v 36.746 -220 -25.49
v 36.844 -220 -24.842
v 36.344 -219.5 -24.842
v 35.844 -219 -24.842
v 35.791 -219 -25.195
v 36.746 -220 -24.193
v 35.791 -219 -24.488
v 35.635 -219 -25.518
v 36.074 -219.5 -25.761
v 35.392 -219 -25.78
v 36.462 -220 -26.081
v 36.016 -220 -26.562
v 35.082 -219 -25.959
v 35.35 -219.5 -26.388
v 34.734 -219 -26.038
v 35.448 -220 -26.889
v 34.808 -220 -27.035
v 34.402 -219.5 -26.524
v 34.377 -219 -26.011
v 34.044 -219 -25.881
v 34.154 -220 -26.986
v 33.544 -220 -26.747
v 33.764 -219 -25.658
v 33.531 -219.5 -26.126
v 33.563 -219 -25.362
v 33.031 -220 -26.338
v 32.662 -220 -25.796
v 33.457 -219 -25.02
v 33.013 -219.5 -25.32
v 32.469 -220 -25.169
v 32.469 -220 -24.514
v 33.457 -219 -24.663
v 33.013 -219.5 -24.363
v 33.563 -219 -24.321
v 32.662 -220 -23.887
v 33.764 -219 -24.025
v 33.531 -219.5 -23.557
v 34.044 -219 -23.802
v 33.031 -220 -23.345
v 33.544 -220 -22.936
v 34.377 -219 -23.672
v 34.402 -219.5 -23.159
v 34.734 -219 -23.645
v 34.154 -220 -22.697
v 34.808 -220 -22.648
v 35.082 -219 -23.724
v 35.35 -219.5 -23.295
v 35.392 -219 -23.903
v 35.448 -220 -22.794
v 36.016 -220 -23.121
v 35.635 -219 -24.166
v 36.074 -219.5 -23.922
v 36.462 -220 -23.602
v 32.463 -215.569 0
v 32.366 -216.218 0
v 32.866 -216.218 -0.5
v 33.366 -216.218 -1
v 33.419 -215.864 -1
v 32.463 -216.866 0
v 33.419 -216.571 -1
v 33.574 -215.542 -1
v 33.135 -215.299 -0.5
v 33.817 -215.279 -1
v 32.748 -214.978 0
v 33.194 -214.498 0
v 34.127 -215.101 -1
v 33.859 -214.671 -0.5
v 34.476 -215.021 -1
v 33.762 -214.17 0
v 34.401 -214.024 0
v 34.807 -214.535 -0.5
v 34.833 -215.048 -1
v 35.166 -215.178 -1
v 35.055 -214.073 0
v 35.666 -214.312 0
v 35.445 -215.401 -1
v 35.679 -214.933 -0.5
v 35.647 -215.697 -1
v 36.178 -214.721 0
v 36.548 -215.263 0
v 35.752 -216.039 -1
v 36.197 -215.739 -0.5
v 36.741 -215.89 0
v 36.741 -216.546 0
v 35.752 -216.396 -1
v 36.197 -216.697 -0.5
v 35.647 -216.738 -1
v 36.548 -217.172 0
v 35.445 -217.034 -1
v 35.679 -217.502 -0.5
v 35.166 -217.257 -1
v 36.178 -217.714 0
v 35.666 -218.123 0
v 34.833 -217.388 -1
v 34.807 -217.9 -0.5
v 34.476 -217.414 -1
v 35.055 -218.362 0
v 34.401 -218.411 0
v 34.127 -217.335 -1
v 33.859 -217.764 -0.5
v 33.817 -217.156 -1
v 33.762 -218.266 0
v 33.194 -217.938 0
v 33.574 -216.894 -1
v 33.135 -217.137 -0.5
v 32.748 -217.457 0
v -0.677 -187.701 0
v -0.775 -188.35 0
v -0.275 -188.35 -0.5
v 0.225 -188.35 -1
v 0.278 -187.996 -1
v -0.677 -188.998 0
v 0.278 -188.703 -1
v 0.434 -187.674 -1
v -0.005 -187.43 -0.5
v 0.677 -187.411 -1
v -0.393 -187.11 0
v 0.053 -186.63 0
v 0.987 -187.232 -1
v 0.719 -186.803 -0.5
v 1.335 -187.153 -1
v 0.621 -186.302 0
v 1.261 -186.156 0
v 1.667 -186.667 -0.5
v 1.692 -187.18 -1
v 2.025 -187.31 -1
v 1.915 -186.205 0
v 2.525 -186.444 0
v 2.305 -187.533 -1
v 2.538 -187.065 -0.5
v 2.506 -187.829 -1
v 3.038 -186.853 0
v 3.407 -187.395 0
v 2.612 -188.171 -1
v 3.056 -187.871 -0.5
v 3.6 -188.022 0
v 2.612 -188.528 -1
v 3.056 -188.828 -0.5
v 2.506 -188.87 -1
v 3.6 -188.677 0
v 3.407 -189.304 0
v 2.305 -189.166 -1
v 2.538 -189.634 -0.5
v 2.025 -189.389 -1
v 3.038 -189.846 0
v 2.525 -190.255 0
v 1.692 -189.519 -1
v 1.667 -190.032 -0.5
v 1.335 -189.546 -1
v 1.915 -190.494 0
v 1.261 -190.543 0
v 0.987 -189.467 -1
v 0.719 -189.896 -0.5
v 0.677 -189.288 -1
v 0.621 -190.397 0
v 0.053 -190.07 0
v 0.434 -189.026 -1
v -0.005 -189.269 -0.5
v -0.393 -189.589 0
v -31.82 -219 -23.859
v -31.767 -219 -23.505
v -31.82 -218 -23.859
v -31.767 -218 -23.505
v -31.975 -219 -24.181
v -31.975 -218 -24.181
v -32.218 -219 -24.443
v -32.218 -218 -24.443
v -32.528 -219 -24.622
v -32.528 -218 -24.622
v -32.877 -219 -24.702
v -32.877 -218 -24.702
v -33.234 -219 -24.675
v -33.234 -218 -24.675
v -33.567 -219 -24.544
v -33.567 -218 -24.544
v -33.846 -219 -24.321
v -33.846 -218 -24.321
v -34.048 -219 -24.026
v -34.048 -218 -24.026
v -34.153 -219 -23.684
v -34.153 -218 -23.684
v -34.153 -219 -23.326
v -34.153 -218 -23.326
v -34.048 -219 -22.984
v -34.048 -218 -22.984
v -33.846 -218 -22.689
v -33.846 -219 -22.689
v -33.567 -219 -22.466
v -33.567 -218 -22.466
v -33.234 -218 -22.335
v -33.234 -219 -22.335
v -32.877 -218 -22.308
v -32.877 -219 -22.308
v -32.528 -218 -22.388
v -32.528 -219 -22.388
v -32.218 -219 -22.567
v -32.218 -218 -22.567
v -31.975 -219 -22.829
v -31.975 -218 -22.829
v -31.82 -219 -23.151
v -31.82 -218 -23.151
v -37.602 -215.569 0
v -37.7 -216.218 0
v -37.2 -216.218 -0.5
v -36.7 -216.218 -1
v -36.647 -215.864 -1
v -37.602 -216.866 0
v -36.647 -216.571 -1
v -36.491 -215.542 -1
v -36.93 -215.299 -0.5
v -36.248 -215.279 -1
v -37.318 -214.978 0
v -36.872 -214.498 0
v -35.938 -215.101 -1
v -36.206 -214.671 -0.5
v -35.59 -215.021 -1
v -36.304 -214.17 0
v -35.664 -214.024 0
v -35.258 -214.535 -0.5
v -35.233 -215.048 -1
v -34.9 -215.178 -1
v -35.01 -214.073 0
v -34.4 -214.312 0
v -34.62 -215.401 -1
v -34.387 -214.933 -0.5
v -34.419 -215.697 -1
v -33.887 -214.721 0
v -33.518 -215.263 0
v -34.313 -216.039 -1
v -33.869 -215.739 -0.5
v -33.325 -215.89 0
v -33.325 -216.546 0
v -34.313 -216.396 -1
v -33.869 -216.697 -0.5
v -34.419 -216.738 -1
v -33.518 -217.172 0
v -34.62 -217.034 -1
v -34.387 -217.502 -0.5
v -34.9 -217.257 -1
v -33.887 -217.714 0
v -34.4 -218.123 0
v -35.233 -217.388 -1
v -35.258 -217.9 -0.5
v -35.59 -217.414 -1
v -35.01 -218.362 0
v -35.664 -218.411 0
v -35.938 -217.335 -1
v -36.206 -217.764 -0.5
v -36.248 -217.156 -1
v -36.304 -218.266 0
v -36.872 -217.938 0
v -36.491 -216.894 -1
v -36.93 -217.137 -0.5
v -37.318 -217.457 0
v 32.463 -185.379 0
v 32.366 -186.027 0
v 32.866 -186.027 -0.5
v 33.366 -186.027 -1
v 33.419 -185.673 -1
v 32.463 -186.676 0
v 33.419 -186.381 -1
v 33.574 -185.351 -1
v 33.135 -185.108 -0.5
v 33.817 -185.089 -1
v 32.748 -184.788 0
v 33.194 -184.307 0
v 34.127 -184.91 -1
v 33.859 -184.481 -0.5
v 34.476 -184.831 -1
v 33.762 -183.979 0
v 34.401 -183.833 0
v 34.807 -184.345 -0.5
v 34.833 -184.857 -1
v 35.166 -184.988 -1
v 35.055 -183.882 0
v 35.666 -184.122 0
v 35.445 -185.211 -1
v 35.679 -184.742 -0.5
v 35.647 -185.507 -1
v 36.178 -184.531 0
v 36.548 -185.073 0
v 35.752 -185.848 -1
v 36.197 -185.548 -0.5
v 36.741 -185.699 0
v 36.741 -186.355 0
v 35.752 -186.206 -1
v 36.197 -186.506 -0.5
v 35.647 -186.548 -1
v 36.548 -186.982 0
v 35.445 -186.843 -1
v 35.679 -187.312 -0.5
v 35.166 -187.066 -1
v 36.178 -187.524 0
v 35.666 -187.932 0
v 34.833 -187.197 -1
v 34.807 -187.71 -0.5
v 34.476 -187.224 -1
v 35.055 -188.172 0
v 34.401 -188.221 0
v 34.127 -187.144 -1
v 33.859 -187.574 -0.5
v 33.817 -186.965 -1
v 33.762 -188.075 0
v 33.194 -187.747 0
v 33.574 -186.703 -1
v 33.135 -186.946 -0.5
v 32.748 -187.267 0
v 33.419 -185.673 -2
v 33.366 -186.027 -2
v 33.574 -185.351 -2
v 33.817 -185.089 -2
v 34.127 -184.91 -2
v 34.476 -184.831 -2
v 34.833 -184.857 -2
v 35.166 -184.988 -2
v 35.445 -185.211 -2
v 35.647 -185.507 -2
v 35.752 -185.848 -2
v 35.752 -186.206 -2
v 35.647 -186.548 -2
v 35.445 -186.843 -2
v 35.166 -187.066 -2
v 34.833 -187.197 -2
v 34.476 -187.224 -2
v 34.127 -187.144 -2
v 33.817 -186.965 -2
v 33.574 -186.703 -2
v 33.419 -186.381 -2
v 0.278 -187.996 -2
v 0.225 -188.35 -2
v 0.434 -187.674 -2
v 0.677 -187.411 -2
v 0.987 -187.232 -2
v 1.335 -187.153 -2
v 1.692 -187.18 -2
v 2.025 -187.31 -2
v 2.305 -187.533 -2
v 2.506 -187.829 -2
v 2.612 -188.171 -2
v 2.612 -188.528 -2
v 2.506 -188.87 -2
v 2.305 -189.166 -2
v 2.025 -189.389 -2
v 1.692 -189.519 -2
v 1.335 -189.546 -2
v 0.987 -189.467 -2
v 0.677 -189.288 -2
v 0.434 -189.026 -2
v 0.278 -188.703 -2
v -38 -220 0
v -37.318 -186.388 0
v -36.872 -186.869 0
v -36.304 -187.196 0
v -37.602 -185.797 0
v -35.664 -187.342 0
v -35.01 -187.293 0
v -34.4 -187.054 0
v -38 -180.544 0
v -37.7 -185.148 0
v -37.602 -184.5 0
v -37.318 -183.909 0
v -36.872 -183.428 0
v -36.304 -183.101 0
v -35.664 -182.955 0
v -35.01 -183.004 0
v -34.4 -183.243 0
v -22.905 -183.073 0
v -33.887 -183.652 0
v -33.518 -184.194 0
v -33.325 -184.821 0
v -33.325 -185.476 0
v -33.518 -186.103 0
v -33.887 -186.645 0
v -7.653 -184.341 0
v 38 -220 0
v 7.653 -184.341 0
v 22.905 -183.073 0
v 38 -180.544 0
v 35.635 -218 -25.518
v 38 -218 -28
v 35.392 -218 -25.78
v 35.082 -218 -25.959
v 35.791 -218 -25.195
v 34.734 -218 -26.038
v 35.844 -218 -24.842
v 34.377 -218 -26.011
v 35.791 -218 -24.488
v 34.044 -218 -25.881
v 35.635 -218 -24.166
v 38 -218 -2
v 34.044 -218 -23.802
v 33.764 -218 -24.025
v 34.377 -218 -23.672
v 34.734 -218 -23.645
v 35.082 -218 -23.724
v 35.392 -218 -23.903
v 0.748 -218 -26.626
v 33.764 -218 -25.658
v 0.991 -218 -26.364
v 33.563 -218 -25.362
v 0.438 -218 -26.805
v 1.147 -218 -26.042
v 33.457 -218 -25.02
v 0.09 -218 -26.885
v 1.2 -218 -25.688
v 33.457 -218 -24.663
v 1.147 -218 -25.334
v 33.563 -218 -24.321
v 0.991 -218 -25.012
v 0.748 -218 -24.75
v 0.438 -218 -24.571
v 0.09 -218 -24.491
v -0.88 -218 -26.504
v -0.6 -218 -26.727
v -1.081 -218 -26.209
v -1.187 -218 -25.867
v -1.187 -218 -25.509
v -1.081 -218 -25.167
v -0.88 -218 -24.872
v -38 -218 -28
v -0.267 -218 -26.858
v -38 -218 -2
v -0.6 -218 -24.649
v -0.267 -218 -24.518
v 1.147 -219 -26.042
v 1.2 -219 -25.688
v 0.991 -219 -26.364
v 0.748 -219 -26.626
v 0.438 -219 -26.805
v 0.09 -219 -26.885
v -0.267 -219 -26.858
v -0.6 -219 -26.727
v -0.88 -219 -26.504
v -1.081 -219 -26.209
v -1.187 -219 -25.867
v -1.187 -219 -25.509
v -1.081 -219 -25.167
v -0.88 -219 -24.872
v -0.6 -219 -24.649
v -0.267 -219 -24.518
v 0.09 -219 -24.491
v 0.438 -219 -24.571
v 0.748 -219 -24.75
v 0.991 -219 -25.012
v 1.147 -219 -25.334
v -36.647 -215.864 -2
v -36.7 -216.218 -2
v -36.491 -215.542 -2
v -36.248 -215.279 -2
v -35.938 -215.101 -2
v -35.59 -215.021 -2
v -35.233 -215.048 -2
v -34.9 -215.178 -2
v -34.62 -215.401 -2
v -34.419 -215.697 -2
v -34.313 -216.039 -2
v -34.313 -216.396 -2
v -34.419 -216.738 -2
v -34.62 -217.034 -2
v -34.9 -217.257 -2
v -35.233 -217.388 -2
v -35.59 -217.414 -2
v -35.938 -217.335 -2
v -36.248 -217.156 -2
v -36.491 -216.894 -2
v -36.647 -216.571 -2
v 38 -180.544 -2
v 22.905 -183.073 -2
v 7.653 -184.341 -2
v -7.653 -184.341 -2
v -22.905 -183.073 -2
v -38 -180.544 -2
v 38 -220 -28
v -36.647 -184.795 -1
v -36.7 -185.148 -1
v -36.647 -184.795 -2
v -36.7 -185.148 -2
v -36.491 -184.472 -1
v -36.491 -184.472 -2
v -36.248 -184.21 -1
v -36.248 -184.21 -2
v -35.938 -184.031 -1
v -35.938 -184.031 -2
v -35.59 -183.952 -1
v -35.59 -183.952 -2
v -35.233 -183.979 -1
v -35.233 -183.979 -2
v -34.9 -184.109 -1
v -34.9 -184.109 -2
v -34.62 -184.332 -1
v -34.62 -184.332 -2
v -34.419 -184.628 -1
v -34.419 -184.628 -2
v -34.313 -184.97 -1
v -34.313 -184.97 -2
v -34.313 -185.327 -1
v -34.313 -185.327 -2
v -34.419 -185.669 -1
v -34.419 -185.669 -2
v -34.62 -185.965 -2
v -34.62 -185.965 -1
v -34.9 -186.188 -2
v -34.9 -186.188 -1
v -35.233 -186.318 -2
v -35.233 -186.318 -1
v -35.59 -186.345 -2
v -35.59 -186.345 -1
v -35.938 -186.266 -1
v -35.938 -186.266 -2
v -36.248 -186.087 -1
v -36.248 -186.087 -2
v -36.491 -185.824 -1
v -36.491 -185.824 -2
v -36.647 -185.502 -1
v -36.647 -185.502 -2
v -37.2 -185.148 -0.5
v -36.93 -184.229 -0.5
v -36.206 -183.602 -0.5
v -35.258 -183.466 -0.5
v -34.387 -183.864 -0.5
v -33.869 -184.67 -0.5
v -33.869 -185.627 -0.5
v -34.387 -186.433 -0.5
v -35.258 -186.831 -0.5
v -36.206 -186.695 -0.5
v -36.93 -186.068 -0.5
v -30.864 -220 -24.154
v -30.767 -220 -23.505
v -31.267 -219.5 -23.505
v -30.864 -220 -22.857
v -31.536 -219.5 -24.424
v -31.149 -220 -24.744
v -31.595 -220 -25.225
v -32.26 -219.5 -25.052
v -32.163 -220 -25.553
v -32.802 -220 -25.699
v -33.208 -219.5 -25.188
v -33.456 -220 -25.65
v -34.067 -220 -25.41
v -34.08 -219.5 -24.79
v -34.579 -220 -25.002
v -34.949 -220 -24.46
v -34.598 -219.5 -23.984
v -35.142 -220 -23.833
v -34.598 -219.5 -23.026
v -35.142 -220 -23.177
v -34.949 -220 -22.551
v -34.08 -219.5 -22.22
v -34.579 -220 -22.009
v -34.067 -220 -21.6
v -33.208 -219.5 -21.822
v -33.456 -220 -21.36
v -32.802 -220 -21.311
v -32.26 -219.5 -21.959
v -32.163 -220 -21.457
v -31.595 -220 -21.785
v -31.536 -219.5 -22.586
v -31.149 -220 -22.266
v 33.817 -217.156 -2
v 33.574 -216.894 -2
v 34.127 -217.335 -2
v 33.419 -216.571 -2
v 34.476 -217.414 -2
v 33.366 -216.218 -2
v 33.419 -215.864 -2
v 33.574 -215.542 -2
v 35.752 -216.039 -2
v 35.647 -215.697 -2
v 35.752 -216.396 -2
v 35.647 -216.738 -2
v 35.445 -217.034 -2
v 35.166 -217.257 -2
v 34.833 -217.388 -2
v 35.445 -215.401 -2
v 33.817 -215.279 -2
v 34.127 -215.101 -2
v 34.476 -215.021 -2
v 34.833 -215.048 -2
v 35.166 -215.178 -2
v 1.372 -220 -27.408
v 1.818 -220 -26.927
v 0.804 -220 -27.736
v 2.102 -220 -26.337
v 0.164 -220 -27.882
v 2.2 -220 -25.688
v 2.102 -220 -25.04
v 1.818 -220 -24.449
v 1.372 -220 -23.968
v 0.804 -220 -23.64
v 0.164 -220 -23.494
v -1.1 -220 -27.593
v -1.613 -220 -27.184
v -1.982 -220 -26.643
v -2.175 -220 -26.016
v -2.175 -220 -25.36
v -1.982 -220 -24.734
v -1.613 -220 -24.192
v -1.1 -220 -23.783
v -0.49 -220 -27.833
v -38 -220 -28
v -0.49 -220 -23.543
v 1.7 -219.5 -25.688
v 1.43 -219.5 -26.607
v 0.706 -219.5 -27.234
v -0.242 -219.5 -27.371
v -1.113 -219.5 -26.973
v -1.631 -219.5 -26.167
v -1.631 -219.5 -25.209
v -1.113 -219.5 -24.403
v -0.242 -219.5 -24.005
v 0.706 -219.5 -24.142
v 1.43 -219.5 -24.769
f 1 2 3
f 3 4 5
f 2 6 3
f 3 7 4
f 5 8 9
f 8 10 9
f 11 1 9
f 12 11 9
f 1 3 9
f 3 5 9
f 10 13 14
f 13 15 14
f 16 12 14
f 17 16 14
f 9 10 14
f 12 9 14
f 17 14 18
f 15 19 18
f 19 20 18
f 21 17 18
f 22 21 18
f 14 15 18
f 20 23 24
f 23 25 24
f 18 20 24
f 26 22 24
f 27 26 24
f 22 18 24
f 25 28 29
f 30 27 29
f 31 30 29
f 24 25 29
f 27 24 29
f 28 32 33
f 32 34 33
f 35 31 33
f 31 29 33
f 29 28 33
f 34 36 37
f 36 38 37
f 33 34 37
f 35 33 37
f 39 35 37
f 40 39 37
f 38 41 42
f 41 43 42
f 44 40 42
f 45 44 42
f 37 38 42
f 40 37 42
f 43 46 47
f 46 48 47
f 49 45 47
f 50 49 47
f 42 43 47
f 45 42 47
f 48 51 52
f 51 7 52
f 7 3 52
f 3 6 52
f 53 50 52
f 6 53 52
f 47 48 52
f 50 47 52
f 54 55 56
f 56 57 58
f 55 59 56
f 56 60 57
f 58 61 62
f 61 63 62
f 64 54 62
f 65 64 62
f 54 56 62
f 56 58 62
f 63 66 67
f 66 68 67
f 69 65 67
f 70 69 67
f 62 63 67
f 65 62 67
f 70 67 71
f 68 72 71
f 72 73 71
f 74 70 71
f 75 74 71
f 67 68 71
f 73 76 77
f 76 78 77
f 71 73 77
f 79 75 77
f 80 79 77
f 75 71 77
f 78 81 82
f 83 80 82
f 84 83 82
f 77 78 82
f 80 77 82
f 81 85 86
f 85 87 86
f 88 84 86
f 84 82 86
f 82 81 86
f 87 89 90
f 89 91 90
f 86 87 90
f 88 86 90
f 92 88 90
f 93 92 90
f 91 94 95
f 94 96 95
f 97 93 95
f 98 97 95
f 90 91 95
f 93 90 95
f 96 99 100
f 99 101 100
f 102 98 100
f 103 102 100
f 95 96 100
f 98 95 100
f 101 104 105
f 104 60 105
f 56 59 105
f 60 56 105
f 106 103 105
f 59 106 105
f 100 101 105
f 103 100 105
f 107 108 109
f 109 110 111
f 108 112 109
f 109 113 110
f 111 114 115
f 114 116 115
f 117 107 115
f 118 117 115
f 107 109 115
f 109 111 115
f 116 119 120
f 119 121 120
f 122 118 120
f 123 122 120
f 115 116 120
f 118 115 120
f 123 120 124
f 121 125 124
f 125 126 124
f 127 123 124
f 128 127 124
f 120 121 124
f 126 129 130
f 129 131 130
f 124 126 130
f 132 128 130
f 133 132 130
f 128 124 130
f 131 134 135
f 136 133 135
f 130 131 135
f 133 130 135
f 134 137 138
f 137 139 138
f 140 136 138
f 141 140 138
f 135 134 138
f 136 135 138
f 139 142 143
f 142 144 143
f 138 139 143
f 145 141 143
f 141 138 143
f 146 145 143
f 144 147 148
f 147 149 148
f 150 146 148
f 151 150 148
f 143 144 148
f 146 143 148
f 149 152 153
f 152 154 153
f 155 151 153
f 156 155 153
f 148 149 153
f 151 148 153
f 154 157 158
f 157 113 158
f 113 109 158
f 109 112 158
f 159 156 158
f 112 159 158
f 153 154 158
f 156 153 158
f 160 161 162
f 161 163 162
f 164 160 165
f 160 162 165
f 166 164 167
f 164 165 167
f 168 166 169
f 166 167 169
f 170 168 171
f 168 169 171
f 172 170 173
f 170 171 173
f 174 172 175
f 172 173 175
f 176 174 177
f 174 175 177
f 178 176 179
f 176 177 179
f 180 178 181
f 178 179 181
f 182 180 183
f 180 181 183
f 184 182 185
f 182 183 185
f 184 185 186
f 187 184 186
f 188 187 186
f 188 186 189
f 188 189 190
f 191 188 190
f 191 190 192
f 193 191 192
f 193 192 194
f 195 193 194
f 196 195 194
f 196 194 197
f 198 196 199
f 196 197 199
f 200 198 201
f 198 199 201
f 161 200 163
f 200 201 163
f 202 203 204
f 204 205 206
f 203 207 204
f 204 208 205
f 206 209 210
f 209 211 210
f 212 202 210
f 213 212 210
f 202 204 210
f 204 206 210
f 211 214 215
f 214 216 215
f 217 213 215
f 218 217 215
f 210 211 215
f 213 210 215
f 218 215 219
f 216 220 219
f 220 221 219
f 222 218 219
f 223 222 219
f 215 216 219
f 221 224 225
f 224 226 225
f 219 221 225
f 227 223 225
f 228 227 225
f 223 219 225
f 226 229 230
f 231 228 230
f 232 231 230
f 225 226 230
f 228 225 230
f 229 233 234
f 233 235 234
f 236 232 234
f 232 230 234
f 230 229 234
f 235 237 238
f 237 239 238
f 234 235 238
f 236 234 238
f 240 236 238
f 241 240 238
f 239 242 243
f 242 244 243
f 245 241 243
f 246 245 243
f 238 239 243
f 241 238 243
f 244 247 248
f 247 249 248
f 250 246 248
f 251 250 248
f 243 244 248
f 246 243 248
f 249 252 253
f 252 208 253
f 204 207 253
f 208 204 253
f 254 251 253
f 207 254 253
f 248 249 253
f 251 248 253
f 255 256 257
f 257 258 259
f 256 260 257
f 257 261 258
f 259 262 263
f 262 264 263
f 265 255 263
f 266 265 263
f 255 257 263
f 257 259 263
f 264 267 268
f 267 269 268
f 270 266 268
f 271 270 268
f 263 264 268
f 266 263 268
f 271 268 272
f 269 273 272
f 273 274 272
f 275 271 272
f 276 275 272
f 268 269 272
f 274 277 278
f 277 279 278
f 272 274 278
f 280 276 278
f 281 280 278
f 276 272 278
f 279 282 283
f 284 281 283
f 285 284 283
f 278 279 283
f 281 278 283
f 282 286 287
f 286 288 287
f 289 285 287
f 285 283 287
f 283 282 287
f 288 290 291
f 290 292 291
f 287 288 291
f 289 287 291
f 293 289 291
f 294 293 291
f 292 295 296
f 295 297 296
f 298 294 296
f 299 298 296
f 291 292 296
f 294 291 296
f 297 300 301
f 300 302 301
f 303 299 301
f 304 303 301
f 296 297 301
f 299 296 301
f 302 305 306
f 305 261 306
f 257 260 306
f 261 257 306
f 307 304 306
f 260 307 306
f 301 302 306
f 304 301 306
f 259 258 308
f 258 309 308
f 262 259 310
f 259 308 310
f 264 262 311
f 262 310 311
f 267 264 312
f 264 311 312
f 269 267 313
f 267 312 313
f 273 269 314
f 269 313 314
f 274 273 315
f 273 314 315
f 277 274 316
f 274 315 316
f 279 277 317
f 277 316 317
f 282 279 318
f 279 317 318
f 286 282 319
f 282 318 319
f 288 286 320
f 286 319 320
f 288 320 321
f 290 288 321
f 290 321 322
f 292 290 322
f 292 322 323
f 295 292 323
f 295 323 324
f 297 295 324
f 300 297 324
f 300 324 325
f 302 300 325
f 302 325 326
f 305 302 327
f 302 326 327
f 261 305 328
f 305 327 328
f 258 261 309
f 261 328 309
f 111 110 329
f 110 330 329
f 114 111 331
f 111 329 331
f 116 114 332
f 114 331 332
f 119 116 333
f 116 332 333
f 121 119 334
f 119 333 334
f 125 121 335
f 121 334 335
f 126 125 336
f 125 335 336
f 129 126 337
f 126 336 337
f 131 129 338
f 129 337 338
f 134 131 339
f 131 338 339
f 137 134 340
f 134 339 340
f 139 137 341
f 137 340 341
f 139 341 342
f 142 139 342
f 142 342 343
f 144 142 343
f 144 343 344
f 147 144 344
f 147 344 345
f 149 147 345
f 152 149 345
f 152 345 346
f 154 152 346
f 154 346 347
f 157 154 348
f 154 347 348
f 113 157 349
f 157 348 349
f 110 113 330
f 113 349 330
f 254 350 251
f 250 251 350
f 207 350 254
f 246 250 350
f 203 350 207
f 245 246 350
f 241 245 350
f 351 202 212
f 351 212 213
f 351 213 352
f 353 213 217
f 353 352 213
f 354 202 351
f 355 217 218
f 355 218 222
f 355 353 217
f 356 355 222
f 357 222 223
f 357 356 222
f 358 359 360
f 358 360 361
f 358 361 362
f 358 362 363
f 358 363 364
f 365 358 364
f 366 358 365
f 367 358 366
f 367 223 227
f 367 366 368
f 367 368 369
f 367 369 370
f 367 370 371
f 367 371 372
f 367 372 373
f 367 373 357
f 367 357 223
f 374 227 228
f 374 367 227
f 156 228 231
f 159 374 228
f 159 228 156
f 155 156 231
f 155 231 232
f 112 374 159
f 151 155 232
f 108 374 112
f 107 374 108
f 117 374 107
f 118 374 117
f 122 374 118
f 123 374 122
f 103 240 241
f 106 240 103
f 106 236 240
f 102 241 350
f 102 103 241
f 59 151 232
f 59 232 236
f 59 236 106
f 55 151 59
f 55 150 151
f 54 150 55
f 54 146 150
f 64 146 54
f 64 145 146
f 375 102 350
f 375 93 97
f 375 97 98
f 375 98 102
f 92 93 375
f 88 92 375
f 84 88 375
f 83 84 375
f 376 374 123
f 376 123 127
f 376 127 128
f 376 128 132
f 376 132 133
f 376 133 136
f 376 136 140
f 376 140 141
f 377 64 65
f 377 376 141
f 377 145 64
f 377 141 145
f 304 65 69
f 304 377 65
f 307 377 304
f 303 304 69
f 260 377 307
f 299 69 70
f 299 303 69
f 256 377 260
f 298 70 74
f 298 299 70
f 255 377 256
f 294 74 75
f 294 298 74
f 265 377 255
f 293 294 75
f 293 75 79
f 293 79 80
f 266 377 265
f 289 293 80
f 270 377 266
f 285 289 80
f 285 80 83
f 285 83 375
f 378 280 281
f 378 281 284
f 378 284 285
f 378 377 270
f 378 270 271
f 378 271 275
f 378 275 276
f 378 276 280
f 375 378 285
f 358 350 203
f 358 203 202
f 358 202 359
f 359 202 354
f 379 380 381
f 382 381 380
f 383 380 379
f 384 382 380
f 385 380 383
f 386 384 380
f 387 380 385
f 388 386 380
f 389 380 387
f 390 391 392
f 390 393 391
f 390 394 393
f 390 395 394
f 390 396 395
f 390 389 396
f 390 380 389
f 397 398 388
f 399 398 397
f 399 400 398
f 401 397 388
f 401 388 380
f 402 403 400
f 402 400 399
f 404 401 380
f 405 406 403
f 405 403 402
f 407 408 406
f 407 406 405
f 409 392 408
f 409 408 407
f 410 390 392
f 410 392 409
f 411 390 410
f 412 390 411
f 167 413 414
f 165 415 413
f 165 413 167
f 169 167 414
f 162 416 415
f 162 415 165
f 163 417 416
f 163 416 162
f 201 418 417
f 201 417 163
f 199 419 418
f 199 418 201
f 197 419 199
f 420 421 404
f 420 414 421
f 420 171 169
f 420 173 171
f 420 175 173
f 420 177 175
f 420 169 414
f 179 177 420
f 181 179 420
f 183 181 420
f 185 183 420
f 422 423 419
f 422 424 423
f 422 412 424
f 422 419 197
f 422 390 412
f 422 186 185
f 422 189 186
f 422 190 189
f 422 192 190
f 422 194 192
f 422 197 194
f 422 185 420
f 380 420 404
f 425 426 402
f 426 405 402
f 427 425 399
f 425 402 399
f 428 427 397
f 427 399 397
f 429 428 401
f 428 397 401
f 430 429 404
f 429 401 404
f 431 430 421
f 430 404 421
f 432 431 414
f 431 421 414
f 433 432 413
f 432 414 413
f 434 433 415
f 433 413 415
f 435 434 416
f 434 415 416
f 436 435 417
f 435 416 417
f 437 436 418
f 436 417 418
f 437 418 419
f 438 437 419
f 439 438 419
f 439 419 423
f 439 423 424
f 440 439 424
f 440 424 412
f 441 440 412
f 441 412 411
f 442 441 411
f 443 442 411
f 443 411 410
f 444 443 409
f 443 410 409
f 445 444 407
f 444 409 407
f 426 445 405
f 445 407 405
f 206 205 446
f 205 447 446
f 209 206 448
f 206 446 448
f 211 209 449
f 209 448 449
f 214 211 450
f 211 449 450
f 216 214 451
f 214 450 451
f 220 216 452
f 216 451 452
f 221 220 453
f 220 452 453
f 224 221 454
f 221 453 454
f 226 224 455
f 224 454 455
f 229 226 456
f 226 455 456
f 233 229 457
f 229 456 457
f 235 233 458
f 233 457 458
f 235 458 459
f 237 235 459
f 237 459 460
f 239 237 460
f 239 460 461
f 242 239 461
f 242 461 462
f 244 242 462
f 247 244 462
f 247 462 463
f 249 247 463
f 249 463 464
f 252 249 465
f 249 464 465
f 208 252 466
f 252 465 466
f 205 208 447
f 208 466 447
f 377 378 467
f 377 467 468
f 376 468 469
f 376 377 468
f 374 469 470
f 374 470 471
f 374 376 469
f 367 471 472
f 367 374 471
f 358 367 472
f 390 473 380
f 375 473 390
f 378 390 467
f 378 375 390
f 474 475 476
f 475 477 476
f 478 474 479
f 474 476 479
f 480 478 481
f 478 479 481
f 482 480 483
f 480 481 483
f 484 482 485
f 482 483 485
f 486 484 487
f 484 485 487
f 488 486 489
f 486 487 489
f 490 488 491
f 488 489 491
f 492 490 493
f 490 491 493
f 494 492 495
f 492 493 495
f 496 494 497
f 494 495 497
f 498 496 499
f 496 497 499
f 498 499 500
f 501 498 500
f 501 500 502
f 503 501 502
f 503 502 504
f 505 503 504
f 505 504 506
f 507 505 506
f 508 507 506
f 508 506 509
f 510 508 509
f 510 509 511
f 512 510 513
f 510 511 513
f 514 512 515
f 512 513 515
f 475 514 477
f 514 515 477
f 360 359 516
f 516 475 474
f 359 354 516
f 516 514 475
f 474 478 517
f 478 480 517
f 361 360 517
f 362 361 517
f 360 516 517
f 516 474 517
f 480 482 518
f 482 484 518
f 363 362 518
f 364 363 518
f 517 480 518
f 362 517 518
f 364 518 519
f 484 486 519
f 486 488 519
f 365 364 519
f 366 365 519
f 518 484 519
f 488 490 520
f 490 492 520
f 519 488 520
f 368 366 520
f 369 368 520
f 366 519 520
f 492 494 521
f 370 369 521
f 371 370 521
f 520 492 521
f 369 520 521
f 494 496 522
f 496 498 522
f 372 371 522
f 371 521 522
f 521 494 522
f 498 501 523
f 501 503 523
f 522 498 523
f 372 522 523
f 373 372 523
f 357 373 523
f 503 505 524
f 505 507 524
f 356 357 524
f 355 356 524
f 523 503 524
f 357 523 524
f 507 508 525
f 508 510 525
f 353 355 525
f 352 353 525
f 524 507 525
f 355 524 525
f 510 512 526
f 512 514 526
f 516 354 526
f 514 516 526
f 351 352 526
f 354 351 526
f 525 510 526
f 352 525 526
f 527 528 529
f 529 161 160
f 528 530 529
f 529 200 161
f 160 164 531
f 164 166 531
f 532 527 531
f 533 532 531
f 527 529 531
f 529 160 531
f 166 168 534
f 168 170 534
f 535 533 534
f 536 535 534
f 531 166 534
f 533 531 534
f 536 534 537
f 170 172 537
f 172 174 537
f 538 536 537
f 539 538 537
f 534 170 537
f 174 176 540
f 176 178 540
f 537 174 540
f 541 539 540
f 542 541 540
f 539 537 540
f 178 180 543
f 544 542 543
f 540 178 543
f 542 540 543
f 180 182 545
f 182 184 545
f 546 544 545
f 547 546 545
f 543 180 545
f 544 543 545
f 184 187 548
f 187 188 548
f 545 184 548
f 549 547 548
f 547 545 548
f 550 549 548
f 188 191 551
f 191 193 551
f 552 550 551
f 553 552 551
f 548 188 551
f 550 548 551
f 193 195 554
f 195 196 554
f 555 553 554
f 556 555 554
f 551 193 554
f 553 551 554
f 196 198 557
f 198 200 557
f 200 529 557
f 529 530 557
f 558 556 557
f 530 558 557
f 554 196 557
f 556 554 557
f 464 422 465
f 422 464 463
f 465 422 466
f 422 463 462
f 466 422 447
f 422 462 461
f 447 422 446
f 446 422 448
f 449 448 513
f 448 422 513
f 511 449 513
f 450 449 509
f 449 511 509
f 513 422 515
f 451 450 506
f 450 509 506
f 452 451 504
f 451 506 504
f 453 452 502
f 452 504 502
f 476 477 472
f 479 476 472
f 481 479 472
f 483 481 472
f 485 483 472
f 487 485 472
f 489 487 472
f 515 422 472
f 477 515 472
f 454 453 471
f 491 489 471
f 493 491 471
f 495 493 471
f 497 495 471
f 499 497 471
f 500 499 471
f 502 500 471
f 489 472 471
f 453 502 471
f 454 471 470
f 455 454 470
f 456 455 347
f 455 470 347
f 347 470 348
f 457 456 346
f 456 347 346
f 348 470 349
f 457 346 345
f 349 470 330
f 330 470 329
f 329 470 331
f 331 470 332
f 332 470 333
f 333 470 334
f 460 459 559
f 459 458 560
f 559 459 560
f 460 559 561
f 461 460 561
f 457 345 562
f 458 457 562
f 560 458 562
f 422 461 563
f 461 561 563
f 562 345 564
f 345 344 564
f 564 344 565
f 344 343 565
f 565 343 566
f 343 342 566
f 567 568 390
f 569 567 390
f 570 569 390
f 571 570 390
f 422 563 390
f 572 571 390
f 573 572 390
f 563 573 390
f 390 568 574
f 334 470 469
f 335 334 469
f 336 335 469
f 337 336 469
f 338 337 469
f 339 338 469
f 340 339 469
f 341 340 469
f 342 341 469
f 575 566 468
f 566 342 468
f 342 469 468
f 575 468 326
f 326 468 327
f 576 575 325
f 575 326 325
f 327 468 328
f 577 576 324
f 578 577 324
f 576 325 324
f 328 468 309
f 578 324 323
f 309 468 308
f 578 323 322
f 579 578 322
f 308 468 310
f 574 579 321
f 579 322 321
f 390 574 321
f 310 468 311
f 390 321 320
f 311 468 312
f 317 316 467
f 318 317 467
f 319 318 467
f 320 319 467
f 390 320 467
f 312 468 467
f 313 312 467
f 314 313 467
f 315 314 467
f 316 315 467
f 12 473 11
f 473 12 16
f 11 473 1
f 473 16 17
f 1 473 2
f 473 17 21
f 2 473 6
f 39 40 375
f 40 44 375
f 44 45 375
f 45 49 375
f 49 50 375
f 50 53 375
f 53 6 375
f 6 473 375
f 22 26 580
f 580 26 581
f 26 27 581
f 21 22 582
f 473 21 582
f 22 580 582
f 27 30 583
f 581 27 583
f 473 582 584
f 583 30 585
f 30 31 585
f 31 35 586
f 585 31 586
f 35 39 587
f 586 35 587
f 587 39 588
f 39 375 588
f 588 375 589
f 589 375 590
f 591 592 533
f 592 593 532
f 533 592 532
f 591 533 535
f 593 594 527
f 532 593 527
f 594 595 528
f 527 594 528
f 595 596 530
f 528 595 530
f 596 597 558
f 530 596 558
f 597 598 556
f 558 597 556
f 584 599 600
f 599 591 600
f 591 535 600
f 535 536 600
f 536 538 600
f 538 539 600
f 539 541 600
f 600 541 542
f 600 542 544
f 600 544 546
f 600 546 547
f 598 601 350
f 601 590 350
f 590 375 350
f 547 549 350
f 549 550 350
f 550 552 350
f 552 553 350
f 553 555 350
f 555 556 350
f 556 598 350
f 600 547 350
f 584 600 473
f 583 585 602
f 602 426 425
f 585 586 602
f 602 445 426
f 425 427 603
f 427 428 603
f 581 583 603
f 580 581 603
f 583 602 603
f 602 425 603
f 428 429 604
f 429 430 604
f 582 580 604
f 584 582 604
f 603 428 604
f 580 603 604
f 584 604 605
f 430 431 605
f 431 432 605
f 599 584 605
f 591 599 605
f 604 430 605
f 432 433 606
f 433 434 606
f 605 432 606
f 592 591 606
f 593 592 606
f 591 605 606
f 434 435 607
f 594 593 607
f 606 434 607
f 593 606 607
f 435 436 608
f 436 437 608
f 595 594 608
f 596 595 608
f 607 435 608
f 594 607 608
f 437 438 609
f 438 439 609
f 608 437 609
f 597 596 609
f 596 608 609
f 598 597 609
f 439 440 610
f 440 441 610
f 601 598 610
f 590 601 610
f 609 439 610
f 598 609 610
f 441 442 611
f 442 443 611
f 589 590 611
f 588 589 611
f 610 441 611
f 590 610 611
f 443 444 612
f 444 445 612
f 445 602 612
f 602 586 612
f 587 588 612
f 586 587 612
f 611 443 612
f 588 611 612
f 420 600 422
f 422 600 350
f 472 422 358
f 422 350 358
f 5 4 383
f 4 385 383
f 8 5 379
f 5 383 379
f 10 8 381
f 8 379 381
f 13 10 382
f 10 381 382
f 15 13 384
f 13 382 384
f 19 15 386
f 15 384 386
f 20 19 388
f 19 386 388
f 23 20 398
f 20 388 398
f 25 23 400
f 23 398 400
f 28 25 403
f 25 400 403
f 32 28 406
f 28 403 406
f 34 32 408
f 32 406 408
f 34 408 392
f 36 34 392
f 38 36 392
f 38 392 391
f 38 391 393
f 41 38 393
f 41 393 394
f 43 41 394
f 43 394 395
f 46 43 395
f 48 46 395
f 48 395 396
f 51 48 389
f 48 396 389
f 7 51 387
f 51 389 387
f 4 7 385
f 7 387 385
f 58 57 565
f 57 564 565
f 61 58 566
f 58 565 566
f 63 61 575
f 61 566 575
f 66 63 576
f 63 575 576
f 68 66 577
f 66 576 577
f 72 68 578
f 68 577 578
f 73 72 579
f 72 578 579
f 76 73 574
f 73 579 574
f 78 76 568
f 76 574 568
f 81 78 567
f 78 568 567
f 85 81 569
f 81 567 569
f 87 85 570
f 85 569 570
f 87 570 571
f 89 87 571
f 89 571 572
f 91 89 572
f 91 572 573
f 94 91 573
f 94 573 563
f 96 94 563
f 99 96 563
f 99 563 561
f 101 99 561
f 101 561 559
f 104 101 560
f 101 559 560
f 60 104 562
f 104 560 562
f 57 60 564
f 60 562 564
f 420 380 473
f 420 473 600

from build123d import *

# Parameters (mm, degrees)
BOSS_EXTRUDE1_DEPTH                                 = 2
SKETCH2_W                                           = 76
SKETCH2_H                                           = 2
BOSS_EXTRUDE2_DEPTH                                 = 26
CSK_FOR_M2_COUNTERSUNK_FLAT_HEAD_SCREW1_D           = 2.4
CSK_FOR_M2_COUNTERSUNK_FLAT_HEAD_SCREW1_CSINK_D     = 4.4
CSK_FOR_M2_COUNTERSUNK_FLAT_HEAD_SCREW1_CSINK_ANGLE = 90
CSK_FOR_M2_COUNTERSUNK_FLAT_HEAD_SCREW2_D           = 2.4
CSK_FOR_M2_COUNTERSUNK_FLAT_HEAD_SCREW2_CSINK_D     = 4.4
CSK_FOR_M2_COUNTERSUNK_FLAT_HEAD_SCREW2_CSINK_ANGLE = 90


with BuildPart() as part:
    # Sketch1 → Boss-Extrude1 (new body)
    with BuildSketch(Plane.XY):
        with BuildLine():
            Line((38, -220), (38, -180.544315889))
            ThreePointArc((38, -180.544315889), (0, -184.5), (-38, -180.544315889))
            Line((-38, -180.544315889), (-38, -220))
            Line((-38, -220), (38, -220))
        make_face()
    extrude(amount=-BOSS_EXTRUDE1_DEPTH)

    # Sketch2 → Boss-Extrude2 (add)
    with BuildSketch(Plane(origin=(0, 0, -2), x_dir=(-1, 0, 0), z_dir=(0, 0, -1))):
        with Locations((0, -219)):
            Rectangle(SKETCH2_W, SKETCH2_H)
    extrude(amount=BOSS_EXTRUDE2_DEPTH)

    # CSK for M2 Countersunk Flat Head Screw1 (through all)
    with Locations(Plane.XY):
        with Locations((-35.5, -216.217638504), (-35.5, -185.148473071), (1.425070676, -188.349538601), (34.565513804, -186.027196942), (34.565513804, -216.217638504)):
            CounterSinkHole(CSK_FOR_M2_COUNTERSUNK_FLAT_HEAD_SCREW1_D / 2, CSK_FOR_M2_COUNTERSUNK_FLAT_HEAD_SCREW1_CSINK_D / 2, counter_sink_angle=CSK_FOR_M2_COUNTERSUNK_FLAT_HEAD_SCREW1_CSINK_ANGLE)

    # CSK for M2 Countersunk Flat Head Screw2 (through all)
    with Locations(Plane(origin=(0, -220, 0), x_dir=(-1, 0, 0), z_dir=(0, -1, 0))):
        with Locations((-34.643963319, 24.841526038), (0, 25.688115944), (32.966559476, 23.505132472)):
            CounterSinkHole(CSK_FOR_M2_COUNTERSUNK_FLAT_HEAD_SCREW2_D / 2, CSK_FOR_M2_COUNTERSUNK_FLAT_HEAD_SCREW2_CSINK_D / 2, counter_sink_angle=CSK_FOR_M2_COUNTERSUNK_FLAT_HEAD_SCREW2_CSINK_ANGLE)


solid = part.part
